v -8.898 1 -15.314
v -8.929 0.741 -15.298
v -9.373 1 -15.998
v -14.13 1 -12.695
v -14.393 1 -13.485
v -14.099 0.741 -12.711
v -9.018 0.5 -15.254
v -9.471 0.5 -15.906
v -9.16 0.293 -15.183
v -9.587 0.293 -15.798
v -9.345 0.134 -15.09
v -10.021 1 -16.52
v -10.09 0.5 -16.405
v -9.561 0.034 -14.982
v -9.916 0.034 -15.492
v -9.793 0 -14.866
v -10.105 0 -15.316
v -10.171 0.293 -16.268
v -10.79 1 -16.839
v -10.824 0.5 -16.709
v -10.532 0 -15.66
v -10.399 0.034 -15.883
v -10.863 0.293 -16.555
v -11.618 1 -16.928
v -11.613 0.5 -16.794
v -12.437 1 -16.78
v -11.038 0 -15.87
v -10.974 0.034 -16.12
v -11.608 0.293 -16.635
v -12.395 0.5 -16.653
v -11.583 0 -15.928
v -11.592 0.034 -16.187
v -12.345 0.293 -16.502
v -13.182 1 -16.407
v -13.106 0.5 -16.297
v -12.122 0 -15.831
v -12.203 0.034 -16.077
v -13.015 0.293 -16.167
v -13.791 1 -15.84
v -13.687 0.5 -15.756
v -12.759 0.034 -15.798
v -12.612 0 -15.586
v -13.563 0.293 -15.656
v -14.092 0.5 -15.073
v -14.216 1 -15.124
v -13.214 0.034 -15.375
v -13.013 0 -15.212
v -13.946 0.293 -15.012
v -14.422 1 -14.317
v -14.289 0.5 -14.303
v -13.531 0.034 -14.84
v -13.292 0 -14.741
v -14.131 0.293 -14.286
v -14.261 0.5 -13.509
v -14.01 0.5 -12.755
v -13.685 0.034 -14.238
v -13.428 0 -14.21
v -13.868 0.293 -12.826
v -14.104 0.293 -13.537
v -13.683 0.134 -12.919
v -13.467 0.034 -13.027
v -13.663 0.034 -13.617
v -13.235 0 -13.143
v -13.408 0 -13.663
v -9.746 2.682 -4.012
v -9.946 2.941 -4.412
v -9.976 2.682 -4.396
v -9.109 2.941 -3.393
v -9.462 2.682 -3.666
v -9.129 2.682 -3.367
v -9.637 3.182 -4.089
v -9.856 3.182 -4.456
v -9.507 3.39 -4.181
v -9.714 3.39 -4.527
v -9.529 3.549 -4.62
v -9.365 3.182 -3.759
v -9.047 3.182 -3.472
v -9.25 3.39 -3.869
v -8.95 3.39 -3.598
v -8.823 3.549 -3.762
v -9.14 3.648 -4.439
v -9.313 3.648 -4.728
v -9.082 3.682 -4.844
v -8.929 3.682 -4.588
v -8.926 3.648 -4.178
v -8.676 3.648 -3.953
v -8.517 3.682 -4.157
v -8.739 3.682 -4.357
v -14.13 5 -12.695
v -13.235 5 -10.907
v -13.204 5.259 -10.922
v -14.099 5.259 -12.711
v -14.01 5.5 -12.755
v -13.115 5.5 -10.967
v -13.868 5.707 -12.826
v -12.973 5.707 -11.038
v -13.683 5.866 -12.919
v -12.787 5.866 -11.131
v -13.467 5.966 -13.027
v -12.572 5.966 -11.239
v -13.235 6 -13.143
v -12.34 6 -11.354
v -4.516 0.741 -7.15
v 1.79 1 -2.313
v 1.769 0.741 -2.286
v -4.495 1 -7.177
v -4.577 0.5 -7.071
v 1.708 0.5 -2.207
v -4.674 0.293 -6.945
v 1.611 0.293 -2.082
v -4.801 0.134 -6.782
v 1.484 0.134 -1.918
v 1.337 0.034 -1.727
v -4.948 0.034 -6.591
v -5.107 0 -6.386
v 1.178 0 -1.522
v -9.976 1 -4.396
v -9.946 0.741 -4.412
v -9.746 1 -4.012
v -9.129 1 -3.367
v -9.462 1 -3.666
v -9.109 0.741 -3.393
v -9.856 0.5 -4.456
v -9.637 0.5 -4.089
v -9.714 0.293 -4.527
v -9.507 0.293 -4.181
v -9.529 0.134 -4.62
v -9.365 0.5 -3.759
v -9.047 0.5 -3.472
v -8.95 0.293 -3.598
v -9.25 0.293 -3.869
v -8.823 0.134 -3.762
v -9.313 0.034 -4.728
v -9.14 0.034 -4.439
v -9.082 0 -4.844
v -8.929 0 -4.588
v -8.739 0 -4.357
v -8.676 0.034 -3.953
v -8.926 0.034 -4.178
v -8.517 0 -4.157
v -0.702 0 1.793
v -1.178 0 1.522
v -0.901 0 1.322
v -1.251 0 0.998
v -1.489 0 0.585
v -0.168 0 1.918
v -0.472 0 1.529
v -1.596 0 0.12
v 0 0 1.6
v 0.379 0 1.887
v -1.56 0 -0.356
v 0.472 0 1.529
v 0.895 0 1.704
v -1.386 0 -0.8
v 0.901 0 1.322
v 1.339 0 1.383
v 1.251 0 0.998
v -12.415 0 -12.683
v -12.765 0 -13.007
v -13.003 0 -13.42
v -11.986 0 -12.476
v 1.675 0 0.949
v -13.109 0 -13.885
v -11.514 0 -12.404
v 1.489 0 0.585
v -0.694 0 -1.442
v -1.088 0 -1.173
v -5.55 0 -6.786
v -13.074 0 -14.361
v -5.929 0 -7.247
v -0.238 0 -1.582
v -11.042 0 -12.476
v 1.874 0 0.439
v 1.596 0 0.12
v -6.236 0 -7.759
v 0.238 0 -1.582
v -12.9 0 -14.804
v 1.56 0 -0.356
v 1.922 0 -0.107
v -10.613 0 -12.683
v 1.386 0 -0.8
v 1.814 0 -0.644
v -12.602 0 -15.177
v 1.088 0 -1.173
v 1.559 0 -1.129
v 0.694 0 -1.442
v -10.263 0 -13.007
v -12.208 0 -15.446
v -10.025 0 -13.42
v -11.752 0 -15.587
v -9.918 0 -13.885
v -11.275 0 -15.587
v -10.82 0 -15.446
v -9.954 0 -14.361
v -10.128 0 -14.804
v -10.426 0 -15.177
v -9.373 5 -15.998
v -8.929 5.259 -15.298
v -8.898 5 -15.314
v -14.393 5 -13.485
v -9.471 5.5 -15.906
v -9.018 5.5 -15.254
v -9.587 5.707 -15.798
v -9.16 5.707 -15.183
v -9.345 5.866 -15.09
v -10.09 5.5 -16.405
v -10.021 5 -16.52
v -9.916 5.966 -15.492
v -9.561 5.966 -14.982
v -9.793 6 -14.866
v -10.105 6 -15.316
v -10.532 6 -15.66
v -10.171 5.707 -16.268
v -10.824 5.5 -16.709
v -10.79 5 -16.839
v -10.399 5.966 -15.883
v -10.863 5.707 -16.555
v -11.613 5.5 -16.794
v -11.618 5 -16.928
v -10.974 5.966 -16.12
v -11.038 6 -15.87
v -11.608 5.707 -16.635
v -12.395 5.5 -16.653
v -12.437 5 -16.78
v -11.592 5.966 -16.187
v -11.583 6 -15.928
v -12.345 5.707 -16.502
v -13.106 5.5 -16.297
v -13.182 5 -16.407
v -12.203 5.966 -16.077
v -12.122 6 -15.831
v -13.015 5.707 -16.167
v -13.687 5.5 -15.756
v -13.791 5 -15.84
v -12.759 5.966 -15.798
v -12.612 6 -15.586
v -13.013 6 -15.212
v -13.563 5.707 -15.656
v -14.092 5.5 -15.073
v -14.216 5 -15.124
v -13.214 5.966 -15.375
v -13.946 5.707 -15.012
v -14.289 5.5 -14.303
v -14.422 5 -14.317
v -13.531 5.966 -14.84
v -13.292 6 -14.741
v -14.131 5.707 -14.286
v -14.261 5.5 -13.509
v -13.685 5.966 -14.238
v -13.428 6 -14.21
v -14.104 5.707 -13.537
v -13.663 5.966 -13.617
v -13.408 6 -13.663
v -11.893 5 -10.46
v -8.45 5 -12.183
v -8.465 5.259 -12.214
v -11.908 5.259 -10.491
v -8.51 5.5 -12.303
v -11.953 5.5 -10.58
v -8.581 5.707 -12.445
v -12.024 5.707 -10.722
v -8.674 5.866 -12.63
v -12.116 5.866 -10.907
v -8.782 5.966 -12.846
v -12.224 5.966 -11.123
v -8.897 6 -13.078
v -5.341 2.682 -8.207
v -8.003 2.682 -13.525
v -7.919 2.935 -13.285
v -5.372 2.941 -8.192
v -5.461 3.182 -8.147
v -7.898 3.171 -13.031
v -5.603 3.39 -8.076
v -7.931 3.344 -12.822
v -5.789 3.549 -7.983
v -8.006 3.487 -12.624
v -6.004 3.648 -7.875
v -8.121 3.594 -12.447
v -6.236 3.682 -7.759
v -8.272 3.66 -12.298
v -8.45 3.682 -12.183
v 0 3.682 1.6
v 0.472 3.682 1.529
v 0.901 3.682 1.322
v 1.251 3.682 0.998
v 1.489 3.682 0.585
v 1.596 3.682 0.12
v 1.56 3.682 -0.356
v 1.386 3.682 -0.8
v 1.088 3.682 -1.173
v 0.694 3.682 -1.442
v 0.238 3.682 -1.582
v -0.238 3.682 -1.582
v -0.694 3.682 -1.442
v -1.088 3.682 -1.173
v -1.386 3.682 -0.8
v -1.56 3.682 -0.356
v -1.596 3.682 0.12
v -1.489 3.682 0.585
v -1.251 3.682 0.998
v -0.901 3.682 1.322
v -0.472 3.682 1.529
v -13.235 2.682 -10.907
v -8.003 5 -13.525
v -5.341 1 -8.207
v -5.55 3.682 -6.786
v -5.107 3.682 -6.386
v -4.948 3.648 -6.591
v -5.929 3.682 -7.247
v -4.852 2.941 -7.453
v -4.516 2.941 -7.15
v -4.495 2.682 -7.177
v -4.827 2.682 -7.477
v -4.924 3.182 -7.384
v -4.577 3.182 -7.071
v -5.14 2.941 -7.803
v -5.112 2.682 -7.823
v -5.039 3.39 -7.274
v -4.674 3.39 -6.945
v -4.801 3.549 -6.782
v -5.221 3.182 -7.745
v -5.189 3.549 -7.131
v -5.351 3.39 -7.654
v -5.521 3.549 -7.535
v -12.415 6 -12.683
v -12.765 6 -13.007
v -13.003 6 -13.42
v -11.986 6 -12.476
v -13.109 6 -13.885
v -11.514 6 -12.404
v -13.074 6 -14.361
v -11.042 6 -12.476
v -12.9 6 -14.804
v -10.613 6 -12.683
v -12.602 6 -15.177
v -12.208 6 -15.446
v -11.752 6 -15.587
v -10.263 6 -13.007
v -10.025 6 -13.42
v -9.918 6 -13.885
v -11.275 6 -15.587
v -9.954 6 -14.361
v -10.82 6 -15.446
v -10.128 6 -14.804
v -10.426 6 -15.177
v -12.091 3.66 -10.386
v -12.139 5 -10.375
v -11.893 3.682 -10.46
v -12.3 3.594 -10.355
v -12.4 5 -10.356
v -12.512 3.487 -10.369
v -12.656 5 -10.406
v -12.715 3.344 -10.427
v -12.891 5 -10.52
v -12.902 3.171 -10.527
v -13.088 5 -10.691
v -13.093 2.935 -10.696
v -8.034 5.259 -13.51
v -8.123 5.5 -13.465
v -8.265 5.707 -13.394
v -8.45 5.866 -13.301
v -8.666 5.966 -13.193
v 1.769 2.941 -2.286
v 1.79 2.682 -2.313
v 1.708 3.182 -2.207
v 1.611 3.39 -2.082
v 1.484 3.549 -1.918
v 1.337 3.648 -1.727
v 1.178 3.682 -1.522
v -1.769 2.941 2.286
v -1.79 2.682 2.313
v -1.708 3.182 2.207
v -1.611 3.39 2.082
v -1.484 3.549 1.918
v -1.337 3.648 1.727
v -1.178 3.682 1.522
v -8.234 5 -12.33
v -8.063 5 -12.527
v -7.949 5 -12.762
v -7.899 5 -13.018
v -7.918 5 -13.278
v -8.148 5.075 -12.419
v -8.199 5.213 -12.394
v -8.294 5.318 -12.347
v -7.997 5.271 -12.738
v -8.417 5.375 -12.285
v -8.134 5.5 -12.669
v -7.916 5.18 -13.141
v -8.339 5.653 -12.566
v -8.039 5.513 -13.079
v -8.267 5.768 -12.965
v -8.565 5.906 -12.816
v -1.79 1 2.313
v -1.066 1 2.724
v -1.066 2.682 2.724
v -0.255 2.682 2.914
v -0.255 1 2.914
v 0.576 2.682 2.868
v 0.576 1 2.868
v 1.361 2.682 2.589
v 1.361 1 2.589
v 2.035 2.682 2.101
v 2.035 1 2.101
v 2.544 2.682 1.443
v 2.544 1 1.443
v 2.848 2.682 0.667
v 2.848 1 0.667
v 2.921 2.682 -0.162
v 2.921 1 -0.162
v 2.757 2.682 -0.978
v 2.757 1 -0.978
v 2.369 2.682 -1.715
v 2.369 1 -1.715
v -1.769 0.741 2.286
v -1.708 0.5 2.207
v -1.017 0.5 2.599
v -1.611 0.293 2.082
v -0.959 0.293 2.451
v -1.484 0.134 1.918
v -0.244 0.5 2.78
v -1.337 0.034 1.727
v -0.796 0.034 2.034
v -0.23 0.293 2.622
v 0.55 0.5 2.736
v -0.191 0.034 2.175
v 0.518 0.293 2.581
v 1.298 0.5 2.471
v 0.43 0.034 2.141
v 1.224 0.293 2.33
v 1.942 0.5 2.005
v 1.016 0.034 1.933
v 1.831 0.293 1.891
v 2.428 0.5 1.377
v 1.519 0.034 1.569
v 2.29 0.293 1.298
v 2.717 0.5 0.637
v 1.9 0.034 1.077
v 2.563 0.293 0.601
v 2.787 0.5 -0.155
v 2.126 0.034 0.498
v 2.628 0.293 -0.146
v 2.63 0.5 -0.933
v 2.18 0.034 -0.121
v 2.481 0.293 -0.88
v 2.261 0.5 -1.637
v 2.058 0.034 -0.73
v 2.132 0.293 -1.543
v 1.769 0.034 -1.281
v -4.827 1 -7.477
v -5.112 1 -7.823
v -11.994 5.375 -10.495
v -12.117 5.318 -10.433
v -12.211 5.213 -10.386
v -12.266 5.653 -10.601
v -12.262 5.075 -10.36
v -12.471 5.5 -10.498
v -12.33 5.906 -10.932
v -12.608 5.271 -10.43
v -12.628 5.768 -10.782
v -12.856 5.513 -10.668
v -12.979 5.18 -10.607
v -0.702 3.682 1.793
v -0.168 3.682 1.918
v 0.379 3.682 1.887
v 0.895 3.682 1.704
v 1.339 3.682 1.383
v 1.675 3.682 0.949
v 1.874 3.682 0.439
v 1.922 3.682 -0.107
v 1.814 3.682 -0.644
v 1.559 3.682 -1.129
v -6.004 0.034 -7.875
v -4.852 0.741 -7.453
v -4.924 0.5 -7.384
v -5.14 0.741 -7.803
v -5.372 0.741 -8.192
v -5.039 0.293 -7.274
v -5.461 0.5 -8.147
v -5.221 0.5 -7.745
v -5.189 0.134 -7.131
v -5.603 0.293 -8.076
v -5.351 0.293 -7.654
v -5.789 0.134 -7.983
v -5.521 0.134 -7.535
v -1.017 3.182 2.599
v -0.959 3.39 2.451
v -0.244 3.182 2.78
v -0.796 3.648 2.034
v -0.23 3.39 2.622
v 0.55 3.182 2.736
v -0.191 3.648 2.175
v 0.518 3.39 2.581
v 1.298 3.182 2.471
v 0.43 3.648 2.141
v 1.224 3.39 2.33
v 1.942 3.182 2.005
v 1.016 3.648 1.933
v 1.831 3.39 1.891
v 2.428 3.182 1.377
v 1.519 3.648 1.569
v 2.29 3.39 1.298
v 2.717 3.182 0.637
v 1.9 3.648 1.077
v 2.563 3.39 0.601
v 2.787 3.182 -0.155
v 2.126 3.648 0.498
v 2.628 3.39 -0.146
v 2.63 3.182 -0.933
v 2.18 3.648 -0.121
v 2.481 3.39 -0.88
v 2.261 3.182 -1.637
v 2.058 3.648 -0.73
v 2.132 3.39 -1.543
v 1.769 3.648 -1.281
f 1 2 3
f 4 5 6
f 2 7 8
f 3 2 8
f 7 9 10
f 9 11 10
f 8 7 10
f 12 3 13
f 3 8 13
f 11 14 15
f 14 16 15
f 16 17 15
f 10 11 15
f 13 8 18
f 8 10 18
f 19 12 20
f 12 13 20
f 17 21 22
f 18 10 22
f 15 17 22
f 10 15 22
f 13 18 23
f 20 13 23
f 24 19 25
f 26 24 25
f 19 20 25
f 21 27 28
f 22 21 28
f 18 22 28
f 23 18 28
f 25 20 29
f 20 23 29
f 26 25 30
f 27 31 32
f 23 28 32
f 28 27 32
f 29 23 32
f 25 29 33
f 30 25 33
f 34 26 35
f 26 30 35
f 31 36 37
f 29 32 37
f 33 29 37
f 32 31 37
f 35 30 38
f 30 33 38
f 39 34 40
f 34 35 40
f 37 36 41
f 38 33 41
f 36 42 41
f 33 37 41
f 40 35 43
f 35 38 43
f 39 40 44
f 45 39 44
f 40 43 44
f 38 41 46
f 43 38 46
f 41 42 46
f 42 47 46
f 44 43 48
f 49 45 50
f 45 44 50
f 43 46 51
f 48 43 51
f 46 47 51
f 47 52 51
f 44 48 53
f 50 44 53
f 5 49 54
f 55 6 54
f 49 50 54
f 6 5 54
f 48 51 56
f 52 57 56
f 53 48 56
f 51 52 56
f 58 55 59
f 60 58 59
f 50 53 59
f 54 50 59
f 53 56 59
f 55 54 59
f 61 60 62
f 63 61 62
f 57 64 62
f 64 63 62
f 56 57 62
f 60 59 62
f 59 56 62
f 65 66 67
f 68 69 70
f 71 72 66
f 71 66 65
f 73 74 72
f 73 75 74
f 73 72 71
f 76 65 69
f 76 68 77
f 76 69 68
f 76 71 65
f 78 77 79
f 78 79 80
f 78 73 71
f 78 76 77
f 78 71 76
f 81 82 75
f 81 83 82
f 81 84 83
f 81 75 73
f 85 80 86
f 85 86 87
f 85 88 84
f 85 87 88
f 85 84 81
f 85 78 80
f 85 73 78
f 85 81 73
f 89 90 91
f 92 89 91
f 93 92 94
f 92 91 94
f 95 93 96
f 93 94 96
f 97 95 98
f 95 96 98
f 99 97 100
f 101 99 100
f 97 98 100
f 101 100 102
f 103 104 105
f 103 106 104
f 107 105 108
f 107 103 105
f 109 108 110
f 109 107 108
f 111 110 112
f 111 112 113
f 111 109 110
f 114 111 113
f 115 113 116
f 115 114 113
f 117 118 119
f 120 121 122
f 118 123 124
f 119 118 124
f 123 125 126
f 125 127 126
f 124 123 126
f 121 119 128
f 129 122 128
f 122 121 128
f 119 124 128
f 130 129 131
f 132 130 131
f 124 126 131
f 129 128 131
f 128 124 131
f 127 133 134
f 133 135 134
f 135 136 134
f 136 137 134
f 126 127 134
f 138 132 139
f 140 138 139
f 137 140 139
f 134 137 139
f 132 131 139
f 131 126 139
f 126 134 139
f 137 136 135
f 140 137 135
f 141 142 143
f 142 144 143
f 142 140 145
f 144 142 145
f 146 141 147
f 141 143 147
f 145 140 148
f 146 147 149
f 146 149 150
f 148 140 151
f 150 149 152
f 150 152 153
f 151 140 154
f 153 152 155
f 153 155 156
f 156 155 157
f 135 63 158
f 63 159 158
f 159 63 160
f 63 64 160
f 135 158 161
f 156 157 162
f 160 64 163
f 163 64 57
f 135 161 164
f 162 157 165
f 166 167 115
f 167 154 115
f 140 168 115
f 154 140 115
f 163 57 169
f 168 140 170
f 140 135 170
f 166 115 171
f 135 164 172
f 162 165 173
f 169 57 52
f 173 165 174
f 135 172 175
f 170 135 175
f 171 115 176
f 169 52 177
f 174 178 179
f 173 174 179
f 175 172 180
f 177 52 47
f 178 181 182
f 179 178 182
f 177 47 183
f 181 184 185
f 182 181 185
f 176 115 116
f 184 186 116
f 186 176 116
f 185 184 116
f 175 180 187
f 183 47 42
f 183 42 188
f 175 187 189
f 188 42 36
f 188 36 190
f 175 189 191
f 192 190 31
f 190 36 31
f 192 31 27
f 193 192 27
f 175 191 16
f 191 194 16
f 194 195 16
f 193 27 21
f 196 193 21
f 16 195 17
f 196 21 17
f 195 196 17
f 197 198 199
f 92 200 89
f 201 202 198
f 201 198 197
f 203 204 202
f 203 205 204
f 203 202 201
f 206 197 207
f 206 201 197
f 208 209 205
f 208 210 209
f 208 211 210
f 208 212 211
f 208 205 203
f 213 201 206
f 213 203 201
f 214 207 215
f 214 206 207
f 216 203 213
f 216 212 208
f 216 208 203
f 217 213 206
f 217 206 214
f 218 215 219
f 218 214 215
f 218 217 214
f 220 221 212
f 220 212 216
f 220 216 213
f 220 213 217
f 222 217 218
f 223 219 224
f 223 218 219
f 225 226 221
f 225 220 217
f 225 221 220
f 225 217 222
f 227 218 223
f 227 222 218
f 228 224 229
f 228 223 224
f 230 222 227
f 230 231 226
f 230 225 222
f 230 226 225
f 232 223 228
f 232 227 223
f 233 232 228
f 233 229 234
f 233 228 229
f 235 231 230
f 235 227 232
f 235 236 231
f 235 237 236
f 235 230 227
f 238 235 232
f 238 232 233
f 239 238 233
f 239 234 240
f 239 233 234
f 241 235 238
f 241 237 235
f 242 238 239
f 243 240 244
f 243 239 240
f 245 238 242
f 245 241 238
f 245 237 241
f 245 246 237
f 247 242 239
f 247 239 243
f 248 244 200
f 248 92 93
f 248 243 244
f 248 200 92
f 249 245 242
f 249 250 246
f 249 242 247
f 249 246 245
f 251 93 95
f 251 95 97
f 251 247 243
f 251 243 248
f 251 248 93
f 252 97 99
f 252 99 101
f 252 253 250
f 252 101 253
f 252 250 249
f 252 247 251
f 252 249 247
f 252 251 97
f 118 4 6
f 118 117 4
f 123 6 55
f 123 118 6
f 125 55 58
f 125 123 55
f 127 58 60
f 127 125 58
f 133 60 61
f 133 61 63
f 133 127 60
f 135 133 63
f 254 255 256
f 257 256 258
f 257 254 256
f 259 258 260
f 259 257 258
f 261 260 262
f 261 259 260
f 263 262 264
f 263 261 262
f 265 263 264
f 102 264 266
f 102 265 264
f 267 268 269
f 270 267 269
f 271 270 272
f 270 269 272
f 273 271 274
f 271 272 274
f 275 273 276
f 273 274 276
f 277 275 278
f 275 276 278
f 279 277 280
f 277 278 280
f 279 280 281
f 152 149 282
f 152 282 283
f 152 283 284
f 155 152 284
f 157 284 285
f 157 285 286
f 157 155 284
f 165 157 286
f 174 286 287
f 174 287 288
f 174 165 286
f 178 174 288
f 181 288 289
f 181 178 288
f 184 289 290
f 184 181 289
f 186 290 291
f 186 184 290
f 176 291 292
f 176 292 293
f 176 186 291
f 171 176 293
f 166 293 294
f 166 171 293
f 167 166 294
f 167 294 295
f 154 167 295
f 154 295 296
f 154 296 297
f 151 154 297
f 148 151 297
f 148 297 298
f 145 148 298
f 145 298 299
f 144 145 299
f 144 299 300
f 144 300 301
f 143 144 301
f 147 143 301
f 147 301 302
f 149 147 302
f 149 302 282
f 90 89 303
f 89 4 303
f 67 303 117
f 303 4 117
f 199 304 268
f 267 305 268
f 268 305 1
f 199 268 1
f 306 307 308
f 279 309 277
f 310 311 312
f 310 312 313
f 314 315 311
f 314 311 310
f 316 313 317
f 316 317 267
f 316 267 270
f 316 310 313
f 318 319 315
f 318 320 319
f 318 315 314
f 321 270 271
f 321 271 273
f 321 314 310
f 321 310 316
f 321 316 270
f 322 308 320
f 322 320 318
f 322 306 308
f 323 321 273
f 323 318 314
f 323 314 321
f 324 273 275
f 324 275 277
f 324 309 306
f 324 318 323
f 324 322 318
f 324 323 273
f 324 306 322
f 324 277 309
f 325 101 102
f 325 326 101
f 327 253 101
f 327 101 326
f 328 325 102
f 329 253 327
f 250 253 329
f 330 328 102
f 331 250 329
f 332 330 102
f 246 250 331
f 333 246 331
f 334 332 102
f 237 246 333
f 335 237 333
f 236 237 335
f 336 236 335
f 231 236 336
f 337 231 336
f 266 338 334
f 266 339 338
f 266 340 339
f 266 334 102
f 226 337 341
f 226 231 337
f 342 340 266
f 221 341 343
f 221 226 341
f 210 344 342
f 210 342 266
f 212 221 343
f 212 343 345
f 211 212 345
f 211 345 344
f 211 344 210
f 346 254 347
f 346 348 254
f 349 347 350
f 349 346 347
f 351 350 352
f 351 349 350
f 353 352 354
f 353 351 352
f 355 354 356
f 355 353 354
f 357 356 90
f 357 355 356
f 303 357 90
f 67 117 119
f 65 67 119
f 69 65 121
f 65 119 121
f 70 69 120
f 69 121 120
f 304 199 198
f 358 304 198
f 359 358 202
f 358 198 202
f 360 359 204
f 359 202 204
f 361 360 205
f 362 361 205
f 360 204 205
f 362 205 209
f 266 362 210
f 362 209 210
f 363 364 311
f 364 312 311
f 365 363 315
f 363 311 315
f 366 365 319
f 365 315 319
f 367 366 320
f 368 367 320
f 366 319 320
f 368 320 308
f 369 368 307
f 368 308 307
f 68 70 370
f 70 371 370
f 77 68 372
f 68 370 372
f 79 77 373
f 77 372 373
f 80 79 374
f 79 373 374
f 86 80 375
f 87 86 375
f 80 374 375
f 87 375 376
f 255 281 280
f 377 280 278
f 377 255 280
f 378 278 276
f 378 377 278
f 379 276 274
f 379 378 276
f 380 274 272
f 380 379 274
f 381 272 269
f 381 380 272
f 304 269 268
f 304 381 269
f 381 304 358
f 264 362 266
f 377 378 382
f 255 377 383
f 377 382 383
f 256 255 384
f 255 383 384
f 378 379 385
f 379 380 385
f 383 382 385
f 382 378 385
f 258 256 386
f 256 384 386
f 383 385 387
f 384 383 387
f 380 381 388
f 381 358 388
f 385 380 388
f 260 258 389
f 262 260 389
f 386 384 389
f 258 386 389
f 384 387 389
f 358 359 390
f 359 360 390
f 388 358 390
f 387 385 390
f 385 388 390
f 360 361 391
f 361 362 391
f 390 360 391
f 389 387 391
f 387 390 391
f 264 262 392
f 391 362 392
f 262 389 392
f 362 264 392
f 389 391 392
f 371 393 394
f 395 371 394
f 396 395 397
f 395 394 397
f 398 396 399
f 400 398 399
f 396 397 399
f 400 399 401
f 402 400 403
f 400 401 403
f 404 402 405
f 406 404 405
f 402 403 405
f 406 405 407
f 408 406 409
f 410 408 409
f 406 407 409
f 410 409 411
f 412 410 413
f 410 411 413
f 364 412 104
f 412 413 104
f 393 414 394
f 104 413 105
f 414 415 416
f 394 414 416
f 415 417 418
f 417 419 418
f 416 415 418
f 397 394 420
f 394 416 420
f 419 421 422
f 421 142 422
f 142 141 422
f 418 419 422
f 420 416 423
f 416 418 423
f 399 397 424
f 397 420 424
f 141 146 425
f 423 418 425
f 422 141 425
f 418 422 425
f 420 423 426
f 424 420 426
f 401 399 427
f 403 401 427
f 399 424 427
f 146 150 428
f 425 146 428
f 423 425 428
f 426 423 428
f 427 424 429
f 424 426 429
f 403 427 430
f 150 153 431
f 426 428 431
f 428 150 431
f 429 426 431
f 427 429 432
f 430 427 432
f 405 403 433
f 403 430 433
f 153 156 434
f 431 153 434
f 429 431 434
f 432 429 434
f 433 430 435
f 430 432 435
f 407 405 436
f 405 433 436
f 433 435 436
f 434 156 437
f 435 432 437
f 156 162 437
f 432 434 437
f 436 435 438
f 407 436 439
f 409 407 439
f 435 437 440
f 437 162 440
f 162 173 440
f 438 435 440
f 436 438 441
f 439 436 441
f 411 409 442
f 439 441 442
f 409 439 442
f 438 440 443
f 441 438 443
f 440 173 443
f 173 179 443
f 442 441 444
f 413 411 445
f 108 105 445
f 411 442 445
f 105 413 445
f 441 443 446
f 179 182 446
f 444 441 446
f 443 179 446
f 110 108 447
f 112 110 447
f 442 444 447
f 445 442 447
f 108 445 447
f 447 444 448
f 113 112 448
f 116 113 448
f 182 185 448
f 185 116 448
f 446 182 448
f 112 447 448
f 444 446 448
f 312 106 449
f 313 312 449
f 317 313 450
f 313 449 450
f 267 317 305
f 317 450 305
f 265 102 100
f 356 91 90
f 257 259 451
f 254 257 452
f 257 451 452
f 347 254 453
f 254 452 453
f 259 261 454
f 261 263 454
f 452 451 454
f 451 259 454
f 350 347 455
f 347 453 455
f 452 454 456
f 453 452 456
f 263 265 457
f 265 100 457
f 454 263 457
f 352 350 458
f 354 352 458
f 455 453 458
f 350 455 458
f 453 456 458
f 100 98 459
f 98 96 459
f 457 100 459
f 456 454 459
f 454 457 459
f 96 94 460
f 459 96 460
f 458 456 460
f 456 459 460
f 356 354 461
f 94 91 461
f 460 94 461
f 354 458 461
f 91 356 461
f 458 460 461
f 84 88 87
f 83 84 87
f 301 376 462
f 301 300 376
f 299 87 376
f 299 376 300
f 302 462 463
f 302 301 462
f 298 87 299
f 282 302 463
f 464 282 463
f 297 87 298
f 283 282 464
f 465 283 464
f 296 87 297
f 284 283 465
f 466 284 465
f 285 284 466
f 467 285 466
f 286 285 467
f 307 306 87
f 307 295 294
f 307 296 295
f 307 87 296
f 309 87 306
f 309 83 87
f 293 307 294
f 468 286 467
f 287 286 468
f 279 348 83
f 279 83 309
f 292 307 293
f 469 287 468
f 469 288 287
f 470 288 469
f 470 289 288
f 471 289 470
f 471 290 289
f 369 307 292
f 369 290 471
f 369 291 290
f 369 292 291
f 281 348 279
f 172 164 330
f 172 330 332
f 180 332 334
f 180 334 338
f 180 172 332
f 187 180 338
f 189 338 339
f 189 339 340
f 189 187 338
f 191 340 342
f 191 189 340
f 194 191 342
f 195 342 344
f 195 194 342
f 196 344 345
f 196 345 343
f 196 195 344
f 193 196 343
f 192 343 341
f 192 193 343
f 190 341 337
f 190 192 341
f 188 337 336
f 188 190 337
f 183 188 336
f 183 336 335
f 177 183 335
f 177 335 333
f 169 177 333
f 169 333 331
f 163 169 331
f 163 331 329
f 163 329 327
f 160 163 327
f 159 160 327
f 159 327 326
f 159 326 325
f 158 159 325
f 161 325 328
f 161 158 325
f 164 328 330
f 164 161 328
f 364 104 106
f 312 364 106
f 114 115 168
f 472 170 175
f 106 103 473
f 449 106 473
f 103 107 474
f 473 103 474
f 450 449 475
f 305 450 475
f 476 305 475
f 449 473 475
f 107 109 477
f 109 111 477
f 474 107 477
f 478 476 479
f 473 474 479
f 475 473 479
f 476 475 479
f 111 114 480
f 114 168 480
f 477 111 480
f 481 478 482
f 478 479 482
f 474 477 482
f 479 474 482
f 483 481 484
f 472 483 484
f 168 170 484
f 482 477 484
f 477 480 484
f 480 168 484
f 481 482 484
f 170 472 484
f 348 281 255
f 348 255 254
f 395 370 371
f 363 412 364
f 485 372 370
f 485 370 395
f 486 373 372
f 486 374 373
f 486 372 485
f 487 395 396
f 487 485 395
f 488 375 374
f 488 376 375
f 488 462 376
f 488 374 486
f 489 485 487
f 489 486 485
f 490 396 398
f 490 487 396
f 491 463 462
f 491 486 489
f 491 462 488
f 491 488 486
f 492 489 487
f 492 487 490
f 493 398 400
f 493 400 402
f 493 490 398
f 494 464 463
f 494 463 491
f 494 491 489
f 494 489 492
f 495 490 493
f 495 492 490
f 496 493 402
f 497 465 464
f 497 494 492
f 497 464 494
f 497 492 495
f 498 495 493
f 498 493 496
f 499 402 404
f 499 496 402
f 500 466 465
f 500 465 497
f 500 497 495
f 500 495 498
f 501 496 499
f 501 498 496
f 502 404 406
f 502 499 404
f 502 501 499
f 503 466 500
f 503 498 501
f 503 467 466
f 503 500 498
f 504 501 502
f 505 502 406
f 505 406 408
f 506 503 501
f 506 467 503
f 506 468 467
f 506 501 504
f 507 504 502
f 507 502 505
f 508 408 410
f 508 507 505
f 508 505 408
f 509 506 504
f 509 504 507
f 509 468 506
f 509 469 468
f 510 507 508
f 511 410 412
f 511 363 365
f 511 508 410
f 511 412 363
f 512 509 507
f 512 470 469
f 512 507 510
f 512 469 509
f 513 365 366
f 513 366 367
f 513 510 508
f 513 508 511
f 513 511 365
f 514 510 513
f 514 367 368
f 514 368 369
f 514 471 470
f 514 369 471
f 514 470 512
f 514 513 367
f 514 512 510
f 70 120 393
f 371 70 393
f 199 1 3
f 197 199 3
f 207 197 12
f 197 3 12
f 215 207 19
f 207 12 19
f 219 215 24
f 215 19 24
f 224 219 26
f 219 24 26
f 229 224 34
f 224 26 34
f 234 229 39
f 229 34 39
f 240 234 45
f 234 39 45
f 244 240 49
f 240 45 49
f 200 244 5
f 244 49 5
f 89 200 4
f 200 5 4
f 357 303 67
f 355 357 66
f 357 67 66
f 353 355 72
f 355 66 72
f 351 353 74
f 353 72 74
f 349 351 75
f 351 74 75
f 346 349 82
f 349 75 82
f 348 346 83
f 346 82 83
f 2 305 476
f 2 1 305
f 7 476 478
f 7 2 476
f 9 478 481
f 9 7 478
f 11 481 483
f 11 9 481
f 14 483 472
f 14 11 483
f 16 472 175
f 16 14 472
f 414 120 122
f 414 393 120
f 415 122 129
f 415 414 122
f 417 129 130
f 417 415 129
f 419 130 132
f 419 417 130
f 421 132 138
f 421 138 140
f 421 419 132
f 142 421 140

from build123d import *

# Parameters (mm, degrees)
SKETCH1_R           = 1.6000000000000019
SKETCH1_R_2         = 1.6
BOSS_EXTRUDE1_DEPTH = 6
FILLET2_R           = 1
CUT_EXTRUDE1_START  = -2.3175
SKETCH3_R           = 1.6
CUT_EXTRUDE1_DEPTH  = 2.3175
FILLET3_R           = 1
FILLET4_R           = 1


with BuildPart() as part:
    # Sketch1 → Boss-Extrude1 (new body)
    with BuildSketch(Plane(origin=(0, 0, 0), x_dir=(1, 0, 0), z_dir=(0, 1, 0))):
        with BuildLine():
            Line((-14.129644992635422, 12.695385617697283), (-9.976148994946639, 4.396395245283378))
            ThreePointArc((-9.976148994946639, 4.396395245283378), (-9.61073090700793, 3.833838918319386), (-9.129445521149016, 3.3665441747595697))
            Line((-9.129445521149016, 3.3665441747595697), (-1.790159058231558, -2.3132132513522183))
            ThreePointArc((-1.790159058231558, -2.3132132513522183), (2.313213251352219, -1.790159058231561), (1.790159058231562, 2.3132132513522174))
            Line((1.790159058231562, 2.3132132513522174), (-4.4947536043408105, 7.1770075109265346))
            ThreePointArc((-4.4947536043408105, 7.1770075109265346), (-4.976038990199725, 7.644302254486349), (-5.3414570781384345, 8.20685858145034))
            Line((-5.3414570781384345, 8.20685858145034), (-8.898255102266939, 15.313602532880296))
            ThreePointArc((-8.898255102266939, 15.313602532880296), (-12.823058505042685, 16.62018902047303), (-14.129644992635422, 12.695385617697283))
        make_face()
        with Locations(Location((-11.51395004745118, 14.00449407528879, 0), (0, 0, 270))):
            Circle(SKETCH1_R, mode=Mode.SUBTRACT)
        with Locations(Location((1.73e-15, -8.7e-16, 0), (0, 0, 270))):
            Circle(SKETCH1_R_2, mode=Mode.SUBTRACT)
    extrude(amount=BOSS_EXTRUDE1_DEPTH)

    # Fillet2
    fillet2_edges = [part.edges().sort_by_distance(p)[0] for p in [
        (-12.05289699379103, 0, -8.545890431490331),
        (-12.823058505042688, 0, -16.62018902047303),
        (-7.119856090202687, 0, -11.760230557165318),
        (-4.976038990199726, 0, -7.64430225448635),
        (-12.823058505042688, 6, -16.62018902047303),
        (-12.05289699379103, 6, -8.545890431490331),
        (-9.61073090700793, 6, -3.833838918319386),
        (-5.459802289690288, 6, -0.5266654617036757),
        (2.3132132513522197, 6, 1.7901590582315603),
        (-1.352297273054624, 6, -4.745110381139376),
        (-4.976038990199726, 6, -7.64430225448635),
        (-1.352297273054624, 0, -4.745110381139376),
        (-7.119856090202687, 6, -11.760230557165318),
        (2.3132132513522197, 0, 1.7901590582315603),
        (-5.459802289690288, 0, -0.5266654617036757),
        (-9.61073090700793, 0, -3.833838918319386),
    ]]
    fillet(fillet2_edges, radius=FILLET2_R)

    # Sketch3 → Cut-Extrude1 (cut)
    # profile 1 of 2: a face of its own
    with BuildSketch(Plane(origin=(0, 6, 0), x_dir=(1, 0, 0), z_dir=(0, 1, 0)).offset(CUT_EXTRUDE1_START)):
        with BuildLine():
            ThreePointArc((-5.106773795189211, 6.386165373712101), (-5.748487643001094, 7.009225031791857), (-6.2357117602527055, 7.75930013441051))
            Line((-6.235711760252705, 7.75930013441051), (-8.449834443261716, 12.183280039497655))
            Line((-8.449834443261715, 12.183280039497657), (-11.892714969401661, 10.460180018394306))
            Line((-11.89271496940166, 10.460180018394302), (-9.08189431283237, 4.843953692323209))
            ThreePointArc((-9.08189431283237, 4.84395369232321), (-8.838282254206565, 4.4689161410138825), (-8.517425330300622, 4.157386311974004))
            Line((-8.517425330300622, 4.157386311974004), (-1.1781388673831632, -1.5223711141377843))
            ThreePointArc((-1.1781388673831628, -1.522371114137784), (1.5223711141377851, -1.1781388673831652), (1.1781388673831665, 1.5223711141377825))
            Line((1.178138867383166, 1.5223711141377825), (-5.10677379518921, 6.386165373712102))
        make_face()
        with Locations(Location((1.73e-15, -8.7e-16, 0), (0, 0, 270))):
            Circle(SKETCH3_R, mode=Mode.SUBTRACT)
    # profile 2 of 2: a face of its own
    with BuildSketch(Plane(origin=(0, 6, 0), x_dir=(1, 0, 0), z_dir=(0, 1, 0)).offset(CUT_EXTRUDE1_START)):
        with BuildLine():
            Line((-8.449834443261716, 12.183280039497655), (-6.235711760252705, 7.75930013441051))
            ThreePointArc((-6.2357117602527055, 7.75930013441051), (-5.748487643001094, 7.009225031791857), (-5.106773795189211, 6.386165373712101))
            Line((-5.10677379518921, 6.386165373712102), (1.178138867383166, 1.5223711141377825))
            ThreePointArc((1.1781388673831665, 1.5223711141377825), (1.5223711141377851, -1.1781388673831652), (-1.1781388673831628, -1.522371114137784))
            Line((-1.1781388673831632, -1.5223711141377843), (-8.517425330300622, 4.157386311974004))
            ThreePointArc((-8.517425330300622, 4.157386311974004), (-8.838282254206565, 4.4689161410138825), (-9.08189431283237, 4.84395369232321))
            Line((-9.08189431283237, 4.843953692323209), (-11.89271496940166, 10.460180018394302))
            Line((-11.892714969401661, 10.460180018394306), (-12.78696965151593, 10.012621571354474))
            Line((-12.78696965151593, 10.012621571354474), (-9.976148994946639, 4.396395245283378))
            ThreePointArc((-9.976148994946639, 4.396395245283378), (-9.61073090700793, 3.8338389183193877), (-9.129445521149018, 3.3665441747595706))
            Line((-9.129445521149016, 3.3665441747595715), (-1.790159058231558, -2.3132132513522183))
            ThreePointArc((-1.7901590582315579, -2.313213251352218), (2.3132132513522183, -1.7901590582315614), (1.7901590582315636, 2.3132132513522152))
            Line((1.7901590582315636, 2.313213251352215), (-4.4947536043408105, 7.1770075109265346))
            ThreePointArc((-4.4947536043408105, 7.177007510926534), (-4.976038990199726, 7.64430225448635), (-5.3414570781384345, 8.20685858145034))
            Line((-5.3414570781384345, 8.20685858145034), (-7.555579761147449, 12.630838486537487))
            Line((-7.555579761147449, 12.630838486537487), (-8.449834443261715, 12.183280039497657))
        make_face()
    extrude(amount=CUT_EXTRUDE1_DEPTH, mode=Mode.SUBTRACT)

    # Fillet3
    fillet3_edges = [part.edges().sort_by_distance(p)[0] for p in [
        (-6.448518419642942, 3.6825, -10.418848533993913),
        (-4.976038990199726, 3.6825, -7.64430225448635),
        (-1.3522972730546234, 3.6825, -4.745110381139375),
        (-5.459802289690288, 3.6825, -0.5266654617036766),
        (-11.381559323231285, 3.6825, -7.204508408318926),
        (-9.61073090700793, 3.6825, -3.8338389183193873),
        (2.3132132513522183, 3.6825, 1.7901590582315612),
    ]]
    fillet(fillet3_edges, radius=FILLET3_R)

    # Fillet4
    fillet4_edges = [part.edges().sort_by_distance(p)[0] for p in [
        (-12.525048519232481, 5.707106781186548, -10.14370840551512),
        (-10.171274706331689, 6, -11.32173002894598),
        (-7.817500893430897, 5.707106781186548, -12.49975165237684),
        (-12.786969651515932, 3.84125, -10.012621571354474),
        (-7.555579761147449, 3.84125, -12.630838486537488),
    ]]
    fillet(fillet4_edges, radius=FILLET4_R)


solid = part.part
